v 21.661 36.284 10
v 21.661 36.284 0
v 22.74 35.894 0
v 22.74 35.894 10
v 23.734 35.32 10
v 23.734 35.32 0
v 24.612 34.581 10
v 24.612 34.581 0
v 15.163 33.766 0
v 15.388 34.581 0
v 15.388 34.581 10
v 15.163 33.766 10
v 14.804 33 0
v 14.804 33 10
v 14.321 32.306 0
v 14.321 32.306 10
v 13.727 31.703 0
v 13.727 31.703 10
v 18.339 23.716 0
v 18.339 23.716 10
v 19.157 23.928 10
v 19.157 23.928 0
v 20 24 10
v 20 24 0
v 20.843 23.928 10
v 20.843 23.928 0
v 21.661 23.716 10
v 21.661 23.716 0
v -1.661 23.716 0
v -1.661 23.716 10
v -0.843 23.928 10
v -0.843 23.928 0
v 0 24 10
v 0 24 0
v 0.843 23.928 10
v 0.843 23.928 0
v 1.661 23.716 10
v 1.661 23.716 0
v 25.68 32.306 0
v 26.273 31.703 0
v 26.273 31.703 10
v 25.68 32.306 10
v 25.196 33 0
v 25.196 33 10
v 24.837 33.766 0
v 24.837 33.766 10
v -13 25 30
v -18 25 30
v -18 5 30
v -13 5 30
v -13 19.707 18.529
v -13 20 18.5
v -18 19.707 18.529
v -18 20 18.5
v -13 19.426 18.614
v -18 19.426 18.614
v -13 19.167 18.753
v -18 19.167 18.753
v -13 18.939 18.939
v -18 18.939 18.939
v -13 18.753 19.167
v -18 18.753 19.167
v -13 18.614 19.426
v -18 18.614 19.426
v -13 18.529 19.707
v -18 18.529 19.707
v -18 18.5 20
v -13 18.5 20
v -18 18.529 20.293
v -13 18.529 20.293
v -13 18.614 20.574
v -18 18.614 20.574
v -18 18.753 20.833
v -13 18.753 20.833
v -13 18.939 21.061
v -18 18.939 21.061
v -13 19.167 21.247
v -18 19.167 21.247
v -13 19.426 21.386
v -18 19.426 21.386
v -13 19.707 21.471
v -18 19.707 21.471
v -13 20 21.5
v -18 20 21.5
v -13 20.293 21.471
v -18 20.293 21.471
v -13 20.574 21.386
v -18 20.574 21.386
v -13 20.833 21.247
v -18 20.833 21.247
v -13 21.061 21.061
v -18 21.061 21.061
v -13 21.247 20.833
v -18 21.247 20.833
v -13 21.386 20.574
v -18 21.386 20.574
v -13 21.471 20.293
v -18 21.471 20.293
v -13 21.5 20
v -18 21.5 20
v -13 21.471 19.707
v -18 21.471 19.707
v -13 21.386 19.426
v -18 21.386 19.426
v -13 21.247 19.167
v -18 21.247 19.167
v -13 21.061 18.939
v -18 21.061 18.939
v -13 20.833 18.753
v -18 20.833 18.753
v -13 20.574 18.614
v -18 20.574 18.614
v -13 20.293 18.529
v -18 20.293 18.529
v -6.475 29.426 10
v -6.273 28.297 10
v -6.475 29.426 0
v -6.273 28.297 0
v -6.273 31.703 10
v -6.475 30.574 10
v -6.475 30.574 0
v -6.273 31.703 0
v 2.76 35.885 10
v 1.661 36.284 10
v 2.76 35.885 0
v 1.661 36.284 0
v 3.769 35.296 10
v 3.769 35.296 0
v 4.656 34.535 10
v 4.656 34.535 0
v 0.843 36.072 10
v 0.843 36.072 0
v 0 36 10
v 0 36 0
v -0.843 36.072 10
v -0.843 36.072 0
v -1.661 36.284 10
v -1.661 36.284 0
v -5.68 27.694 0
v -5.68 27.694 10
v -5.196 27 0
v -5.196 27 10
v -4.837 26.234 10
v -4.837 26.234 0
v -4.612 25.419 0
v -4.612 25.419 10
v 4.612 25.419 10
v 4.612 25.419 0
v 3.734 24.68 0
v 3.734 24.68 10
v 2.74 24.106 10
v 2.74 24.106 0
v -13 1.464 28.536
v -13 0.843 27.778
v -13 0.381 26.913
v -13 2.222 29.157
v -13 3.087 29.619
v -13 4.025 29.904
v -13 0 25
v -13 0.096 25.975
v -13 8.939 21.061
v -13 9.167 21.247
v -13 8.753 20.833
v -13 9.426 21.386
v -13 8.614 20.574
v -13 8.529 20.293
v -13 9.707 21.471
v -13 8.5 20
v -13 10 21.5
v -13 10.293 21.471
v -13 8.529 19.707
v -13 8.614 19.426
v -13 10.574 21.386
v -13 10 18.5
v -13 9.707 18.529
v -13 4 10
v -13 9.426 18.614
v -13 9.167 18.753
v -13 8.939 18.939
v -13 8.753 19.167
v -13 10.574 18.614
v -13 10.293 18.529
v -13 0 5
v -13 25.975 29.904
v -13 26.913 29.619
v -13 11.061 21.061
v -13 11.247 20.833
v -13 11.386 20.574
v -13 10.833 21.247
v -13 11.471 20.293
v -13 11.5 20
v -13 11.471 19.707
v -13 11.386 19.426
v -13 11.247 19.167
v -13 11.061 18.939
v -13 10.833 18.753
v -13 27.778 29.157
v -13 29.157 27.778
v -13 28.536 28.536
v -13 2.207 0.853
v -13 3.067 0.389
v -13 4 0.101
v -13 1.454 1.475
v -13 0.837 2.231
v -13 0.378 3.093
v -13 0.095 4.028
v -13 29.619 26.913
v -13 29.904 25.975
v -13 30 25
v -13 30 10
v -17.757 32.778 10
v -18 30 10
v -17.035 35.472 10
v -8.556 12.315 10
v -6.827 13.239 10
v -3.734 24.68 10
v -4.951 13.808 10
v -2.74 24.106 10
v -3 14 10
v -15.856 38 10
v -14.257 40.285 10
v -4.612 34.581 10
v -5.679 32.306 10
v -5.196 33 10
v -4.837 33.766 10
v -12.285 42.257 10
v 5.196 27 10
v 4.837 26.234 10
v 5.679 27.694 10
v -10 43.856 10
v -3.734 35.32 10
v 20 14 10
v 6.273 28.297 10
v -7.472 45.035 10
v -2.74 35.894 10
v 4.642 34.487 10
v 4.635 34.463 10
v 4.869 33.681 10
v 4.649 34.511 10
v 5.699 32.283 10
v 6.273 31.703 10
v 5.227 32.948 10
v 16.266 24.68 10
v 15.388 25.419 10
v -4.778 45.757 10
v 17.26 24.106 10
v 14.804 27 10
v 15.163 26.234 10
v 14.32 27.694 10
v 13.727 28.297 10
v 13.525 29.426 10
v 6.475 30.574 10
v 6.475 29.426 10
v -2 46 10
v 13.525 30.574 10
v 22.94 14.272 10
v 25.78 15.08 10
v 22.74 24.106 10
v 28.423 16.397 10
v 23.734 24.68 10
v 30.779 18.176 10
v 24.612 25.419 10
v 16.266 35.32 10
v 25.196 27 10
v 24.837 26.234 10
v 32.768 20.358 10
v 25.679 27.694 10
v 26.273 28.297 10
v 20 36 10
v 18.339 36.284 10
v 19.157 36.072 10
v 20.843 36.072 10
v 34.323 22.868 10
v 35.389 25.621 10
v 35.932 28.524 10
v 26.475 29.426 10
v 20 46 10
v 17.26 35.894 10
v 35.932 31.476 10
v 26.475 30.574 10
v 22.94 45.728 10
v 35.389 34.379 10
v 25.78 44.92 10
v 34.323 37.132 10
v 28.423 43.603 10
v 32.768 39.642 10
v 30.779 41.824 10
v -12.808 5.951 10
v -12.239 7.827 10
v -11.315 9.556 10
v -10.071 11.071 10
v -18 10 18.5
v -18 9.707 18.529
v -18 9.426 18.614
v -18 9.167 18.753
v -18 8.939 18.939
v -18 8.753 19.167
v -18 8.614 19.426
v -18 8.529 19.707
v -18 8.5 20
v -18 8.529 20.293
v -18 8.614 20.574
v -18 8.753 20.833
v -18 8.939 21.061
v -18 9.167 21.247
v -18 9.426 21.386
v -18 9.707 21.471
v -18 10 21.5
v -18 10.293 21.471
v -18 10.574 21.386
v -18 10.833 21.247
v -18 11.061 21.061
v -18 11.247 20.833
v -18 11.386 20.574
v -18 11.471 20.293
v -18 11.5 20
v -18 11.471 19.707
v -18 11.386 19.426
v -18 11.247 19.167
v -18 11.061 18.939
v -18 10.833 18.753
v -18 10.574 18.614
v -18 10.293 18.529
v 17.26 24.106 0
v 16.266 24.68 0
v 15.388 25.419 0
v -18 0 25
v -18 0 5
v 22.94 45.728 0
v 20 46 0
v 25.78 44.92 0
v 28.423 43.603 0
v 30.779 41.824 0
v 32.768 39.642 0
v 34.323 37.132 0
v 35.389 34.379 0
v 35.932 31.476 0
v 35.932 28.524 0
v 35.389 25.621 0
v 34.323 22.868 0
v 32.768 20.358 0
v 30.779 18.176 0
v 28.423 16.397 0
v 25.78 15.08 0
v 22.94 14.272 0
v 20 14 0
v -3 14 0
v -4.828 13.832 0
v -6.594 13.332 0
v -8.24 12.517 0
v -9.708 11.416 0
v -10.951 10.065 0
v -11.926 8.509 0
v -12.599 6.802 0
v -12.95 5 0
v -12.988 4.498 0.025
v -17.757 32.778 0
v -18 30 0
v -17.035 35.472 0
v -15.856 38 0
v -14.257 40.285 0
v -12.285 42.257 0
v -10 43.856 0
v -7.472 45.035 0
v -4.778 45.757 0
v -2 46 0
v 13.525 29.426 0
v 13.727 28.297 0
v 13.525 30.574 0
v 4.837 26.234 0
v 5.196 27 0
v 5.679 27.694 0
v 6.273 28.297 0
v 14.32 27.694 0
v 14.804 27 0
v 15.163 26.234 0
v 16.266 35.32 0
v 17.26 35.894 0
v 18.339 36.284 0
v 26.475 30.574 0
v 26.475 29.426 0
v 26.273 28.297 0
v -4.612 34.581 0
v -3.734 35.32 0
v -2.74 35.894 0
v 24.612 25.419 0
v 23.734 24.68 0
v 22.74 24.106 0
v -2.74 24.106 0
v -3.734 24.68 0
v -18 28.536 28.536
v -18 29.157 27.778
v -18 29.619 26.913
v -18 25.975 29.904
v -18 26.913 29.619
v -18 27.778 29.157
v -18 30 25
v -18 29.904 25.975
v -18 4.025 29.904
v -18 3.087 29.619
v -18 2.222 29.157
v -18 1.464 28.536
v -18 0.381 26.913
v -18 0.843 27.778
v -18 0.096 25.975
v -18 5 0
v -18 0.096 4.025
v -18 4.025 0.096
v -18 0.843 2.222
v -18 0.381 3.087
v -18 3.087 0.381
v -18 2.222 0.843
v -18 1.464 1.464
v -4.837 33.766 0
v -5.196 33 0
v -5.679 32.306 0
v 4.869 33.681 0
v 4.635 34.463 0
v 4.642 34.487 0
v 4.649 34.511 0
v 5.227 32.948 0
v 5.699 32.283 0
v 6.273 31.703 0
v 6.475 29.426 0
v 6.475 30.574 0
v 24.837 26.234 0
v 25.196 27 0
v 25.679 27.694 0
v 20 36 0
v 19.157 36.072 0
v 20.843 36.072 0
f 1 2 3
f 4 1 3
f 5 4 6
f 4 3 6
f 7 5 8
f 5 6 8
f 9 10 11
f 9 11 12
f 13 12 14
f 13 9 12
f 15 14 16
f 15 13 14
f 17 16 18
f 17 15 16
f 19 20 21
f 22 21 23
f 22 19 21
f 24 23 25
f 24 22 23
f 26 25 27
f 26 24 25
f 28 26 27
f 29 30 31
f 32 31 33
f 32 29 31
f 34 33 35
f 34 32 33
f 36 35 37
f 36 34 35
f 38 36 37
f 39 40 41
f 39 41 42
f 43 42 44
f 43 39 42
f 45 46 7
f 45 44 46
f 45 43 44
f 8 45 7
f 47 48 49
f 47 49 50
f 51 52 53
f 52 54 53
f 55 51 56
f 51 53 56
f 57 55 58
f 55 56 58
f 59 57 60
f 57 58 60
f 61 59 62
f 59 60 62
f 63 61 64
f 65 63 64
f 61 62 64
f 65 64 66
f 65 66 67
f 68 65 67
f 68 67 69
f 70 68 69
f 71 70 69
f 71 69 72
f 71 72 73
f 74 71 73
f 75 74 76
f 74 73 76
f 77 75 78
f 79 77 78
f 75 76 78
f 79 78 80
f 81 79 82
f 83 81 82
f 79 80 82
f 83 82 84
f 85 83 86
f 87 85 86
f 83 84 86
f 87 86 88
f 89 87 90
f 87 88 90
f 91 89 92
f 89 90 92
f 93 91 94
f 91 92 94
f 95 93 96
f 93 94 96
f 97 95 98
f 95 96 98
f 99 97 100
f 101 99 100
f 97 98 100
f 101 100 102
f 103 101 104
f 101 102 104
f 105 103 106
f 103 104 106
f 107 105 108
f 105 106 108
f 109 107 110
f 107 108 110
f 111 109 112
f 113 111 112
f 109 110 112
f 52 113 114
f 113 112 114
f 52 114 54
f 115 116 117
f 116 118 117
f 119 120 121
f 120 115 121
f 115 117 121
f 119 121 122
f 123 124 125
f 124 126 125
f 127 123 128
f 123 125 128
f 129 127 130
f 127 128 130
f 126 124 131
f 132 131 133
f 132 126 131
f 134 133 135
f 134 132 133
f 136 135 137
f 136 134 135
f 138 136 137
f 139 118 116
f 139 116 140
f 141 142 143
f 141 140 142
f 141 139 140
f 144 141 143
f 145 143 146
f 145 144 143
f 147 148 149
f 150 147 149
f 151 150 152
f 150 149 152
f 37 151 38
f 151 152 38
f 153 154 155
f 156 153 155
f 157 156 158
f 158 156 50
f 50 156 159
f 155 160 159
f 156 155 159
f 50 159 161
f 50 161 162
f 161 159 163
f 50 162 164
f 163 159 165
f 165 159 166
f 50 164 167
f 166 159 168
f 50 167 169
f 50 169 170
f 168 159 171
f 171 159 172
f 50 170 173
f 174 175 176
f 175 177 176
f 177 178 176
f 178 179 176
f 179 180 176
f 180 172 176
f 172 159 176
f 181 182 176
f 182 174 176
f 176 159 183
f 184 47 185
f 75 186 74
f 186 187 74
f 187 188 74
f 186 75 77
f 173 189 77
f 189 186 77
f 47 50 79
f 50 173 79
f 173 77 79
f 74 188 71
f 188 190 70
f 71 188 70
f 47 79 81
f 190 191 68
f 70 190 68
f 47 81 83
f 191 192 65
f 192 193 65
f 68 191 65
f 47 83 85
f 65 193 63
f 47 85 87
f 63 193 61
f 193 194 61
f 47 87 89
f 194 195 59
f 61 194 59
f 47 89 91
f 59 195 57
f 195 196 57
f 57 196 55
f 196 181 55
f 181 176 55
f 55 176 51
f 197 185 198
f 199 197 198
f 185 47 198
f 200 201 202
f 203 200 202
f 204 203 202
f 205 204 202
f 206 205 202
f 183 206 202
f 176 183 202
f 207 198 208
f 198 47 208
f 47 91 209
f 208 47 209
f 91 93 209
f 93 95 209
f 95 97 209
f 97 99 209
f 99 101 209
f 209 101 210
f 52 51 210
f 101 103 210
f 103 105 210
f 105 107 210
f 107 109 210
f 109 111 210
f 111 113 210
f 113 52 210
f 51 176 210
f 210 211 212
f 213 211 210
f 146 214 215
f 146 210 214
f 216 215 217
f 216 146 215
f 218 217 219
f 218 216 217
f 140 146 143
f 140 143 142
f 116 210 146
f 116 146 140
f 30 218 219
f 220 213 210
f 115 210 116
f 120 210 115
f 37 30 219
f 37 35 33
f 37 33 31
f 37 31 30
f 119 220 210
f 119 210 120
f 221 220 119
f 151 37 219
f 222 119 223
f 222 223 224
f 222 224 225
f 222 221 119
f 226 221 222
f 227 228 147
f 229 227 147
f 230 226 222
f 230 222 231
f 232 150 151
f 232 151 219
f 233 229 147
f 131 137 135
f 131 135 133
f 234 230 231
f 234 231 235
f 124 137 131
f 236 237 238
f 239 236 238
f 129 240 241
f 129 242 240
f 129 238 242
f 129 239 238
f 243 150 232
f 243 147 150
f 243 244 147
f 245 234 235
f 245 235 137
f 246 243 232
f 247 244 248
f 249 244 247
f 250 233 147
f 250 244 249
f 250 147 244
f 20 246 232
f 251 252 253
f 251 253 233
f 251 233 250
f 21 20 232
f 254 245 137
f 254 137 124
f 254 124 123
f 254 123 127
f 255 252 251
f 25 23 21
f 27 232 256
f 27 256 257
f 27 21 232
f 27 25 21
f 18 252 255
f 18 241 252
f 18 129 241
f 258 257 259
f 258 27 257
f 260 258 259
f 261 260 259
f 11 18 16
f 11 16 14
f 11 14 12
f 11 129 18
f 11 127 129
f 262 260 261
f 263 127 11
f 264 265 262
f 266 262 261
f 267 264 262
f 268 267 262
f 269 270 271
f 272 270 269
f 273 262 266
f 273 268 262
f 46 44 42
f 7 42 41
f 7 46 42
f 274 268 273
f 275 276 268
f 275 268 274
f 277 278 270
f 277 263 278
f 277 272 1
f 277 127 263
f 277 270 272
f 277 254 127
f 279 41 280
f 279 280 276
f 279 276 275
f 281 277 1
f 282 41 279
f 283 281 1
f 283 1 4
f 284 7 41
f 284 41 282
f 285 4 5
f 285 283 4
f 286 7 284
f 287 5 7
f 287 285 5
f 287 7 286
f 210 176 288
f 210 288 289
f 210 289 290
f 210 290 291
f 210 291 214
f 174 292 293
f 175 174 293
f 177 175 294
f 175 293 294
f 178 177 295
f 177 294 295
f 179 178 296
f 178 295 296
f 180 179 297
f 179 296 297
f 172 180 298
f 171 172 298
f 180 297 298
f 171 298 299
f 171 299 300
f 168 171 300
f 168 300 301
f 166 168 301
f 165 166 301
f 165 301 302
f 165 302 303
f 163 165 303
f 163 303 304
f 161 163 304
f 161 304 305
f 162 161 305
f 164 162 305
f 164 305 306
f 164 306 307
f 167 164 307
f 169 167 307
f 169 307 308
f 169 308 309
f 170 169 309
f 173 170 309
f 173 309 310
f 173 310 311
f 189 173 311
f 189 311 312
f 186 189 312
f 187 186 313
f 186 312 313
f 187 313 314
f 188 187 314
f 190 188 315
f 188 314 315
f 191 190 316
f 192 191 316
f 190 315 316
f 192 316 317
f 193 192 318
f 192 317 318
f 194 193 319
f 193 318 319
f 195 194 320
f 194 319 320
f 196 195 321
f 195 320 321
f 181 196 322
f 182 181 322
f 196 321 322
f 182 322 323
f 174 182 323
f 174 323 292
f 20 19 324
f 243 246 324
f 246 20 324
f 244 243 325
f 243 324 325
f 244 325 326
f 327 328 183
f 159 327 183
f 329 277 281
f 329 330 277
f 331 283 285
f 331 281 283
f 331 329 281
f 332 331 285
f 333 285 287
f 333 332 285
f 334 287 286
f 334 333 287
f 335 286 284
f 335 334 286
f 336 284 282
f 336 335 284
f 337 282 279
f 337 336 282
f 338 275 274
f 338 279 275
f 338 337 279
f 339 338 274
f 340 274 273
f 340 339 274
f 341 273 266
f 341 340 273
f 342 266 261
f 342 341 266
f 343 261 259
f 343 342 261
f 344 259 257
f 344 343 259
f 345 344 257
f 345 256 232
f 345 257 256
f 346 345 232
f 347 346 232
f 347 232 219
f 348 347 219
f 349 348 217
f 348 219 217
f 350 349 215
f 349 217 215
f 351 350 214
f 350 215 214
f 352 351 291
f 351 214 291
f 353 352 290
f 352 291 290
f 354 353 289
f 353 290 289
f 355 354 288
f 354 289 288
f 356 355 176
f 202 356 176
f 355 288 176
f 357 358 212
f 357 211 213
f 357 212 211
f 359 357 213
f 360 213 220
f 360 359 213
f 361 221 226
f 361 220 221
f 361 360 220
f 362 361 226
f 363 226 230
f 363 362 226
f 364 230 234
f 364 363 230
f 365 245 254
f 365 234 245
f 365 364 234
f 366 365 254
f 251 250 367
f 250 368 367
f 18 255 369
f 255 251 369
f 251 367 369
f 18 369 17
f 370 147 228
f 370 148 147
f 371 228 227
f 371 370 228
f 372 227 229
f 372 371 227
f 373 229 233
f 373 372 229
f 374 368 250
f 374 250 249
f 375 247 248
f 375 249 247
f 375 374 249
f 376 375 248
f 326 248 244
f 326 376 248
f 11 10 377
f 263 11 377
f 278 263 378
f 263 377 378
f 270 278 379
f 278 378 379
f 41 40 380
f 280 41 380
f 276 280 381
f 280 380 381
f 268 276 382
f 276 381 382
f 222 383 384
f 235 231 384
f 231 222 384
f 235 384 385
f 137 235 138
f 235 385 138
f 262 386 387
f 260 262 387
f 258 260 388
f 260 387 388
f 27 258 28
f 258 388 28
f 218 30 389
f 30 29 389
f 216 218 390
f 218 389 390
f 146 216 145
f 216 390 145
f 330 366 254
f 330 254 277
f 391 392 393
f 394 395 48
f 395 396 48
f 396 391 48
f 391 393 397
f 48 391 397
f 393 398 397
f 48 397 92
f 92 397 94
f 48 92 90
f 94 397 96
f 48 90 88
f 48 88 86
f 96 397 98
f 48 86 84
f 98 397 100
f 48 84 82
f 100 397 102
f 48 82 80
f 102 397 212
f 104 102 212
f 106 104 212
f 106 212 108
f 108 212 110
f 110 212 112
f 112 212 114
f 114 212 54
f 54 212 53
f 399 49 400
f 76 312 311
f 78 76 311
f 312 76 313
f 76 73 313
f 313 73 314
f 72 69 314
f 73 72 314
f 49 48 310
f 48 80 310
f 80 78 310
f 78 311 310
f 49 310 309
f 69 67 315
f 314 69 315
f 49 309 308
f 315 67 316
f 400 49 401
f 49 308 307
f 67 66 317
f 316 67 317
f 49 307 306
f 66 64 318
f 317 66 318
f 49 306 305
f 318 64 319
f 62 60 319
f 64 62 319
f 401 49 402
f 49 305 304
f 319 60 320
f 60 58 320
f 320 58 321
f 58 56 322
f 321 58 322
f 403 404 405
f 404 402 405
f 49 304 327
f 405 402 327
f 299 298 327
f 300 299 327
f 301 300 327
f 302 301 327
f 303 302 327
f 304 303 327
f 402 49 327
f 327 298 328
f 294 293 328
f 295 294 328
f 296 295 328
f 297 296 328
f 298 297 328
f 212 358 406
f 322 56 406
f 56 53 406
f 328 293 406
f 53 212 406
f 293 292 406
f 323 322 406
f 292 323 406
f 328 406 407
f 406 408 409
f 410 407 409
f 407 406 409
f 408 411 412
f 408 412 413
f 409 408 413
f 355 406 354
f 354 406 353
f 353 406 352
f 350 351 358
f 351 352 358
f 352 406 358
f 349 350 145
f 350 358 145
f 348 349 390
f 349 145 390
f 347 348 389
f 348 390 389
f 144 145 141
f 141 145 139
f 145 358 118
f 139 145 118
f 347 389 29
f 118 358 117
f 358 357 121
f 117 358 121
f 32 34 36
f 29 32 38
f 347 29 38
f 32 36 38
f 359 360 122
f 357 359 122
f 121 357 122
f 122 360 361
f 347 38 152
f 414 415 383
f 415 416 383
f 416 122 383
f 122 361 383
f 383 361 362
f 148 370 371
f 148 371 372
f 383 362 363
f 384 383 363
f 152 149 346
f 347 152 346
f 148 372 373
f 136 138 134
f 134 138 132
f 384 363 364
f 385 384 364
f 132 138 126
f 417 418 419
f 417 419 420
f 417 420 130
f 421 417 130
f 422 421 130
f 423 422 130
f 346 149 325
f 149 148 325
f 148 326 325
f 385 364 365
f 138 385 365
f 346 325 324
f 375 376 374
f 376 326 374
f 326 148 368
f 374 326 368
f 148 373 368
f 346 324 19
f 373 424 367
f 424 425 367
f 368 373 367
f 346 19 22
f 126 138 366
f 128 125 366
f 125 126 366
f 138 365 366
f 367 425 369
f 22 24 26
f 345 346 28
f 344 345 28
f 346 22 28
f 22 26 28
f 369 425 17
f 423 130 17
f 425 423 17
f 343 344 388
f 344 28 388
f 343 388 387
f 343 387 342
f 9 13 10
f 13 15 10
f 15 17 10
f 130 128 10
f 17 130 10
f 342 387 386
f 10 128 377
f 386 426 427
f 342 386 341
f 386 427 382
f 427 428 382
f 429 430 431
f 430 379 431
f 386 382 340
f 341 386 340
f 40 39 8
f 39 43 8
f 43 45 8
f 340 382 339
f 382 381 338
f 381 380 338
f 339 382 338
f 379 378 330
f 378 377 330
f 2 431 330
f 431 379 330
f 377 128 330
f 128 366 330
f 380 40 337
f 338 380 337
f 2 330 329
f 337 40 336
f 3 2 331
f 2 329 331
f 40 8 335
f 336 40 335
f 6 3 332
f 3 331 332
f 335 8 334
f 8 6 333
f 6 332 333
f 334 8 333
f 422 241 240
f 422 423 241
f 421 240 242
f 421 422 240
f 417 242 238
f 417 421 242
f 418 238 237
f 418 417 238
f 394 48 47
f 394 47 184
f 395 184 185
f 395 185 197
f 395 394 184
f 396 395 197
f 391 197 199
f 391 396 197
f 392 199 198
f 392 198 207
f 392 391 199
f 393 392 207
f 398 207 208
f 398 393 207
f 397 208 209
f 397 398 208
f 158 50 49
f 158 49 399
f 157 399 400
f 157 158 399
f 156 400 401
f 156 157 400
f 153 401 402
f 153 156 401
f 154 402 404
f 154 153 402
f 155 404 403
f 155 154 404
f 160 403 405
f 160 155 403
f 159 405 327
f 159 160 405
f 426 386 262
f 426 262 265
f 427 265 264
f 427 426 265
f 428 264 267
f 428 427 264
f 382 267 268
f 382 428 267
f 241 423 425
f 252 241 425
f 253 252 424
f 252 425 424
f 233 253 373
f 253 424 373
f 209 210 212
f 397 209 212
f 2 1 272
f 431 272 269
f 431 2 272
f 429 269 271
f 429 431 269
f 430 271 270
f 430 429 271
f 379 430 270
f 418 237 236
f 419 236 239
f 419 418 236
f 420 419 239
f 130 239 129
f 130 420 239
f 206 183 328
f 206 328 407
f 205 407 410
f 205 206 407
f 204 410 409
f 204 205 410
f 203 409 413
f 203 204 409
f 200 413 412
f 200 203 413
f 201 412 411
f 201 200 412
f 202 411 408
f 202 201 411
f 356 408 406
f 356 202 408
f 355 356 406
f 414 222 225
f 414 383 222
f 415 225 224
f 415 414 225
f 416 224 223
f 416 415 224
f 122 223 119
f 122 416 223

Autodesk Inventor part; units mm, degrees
ref_plane "YZ Plane" through (0, 0, 0) normal (1, 0, 0) x (0, 1, 0)
ref_plane "XZ Plane" through (0, 0, 0) normal (0, 1, 0) x (-1, 0, 0)
ref_plane "XY Plane" through (0, 0, 0) normal (0, 0, 1) x (1, 0, 0)
sketch "Sketch1" plane through (0, 0, 0) normal (0, 0, 1) x (1, 0, 0)
  circle A0 centre (0, 0) radius 9.25
  circle A1 centre (0, 30) radius 6
  circle A2 centre (20, 30) radius 6
  circle A3 centre (0, 30) radius 6.5
  circle A4 centre (20, 30) radius 6.5
  arc A5 (-1.6614, 36.2841) -> (1.6614, 36.2841) centre (0, 41) ccw
  arc A6 (-6.2729, 31.7032) -> (-4.6115, 34.5808) centre (-9.5263, 35.5) ccw
  arc A7 (-4.6115, 25.4192) -> (-6.2729, 28.2968) centre (-9.5263, 24.5) ccw
  arc A8 (1.6614, 23.7159) -> (-1.6614, 23.7159) centre (0, 19) ccw
  arc A9 (6.2729, 28.2968) -> (4.6115, 25.4192) centre (9.5263, 24.5) ccw
  arc A10 (4.6115, 34.5808) -> (6.2729, 31.7032) centre (9.5263, 35.5) ccw
  arc A11 (18.3386, 36.2841) -> (21.6614, 36.2841) centre (20, 41) ccw
  arc A12 (13.7271, 31.7032) -> (15.3885, 34.5808) centre (10.4737, 35.5) ccw
  arc A13 (15.3885, 25.4192) -> (13.7271, 28.2968) centre (10.4737, 24.5) ccw
  arc A14 (21.6614, 23.7159) -> (18.3386, 23.7159) centre (20, 19) ccw
  arc A15 (26.2729, 28.2968) -> (24.6115, 25.4192) centre (29.5263, 24.5) ccw
  arc A16 (24.6115, 34.5808) -> (26.2729, 31.7032) centre (29.5263, 35.5) ccw
  arc A17 (4.6562, 34.5353) -> (4.5, 33.9686) centre (20, 30) ccw
  arc A18 (20, 14) -> (20, 46) centre (20, 30) ccw
  line L0 (-18, 30) -> (-18, 0)
  line L1 (-2, 46) -> (20, 46)
  line L2 (-18, 0) -> (-13, 0)
  line L3 (-13, 0) -> (-13, 30)
  line L4 (-13, 30) -> (-18, 30)
  line L5 (-18, 30) -> (-18, 0)
  arc A19 (-2, 46) -> (-18, 30) centre (-2, 30) ccw
  line L6 (20, 14) -> (-13, 14)
  point P0 (15.2791, 25.532)
  point P1 (-18, 30)
  point P2 (-1.6614, 23.7159)
  point P3 (1.6614, 23.7159)
  point P4 (-6.2729, 28.2968)
  point P5 (-4.6115, 25.4192)
  point P6 (-4.6115, 34.5808)
  point P7 (4.635, 34.4629)
  point P8 (6.2729, 31.7032)
  point P9 (18.3386, 23.7159)
  point P10 (21.6614, 23.7159)
  point P11 (13.7271, 31.7032)
  point P12 (26.2729, 31.7032)
  point P13 (15.3885, 25.4192)
  point P14 (15.3885, 34.5808)
  point P15 (4.6115, 25.4192)
  dimension "d1" = 12
  dimension "d0" = 18.5
  dimension "d2" = 30
  dimension "d3" = 12
  dimension "d4" = 20
  dimension "d5" = 13
  dimension "d6" = 13
  dimension "d7" = 5
  dimension "d10" = 360
  dimension "d12" = 5
  dimension "d15" = 360
  dimension "d21" = 16
  dimension "d25" = 5
  dimension "d26" = 30
  dimension "d52" = 18
extrude "Extrusion1" add sketch "Sketch1" along normal blind 10 contours A10 A17 A3 | A9 A3 | A8 A3 | A5 A3 | A7 A3 | A6 A3 | A16 A4 | A15 A4 | A11 A4 | A14 A4 | A12 A4 | A13 A4 | L6 L3 L4 A19 L1 A18 | L3 L2 L0 L4 picked at (5.482, 33.1405)
fillet "Fillet2" radius 10 1 edges at (-13, 14, 5)
extrude "Extrusion3" add sketch "Sketch1" along normal blind 30 contours L3 L2 L0 L4
fillet "Fillet3" radius 5 3 edges at (-15.5, 30, 30) (-15.5, 0, 30) (-15.5, 0, 0)
sketch "Sketch3" plane through (-13, 4, 10) normal (1, 0, 0) x (0, 0, -1)
  line L0 (0, 26) -> (-15, 26) projected
  line L1 (-20, 1) -> (-20, 21) projected
  point P0 (10, -4)
  point P1 (-10, 16)
  dimension "d57" = 10
  dimension "d58" = 10
hole "Hole2" at (-13, 20, 20) direction (-1, 0, 0) diameter 3 end through all
sketch "Sketch4" plane through (-13, 4, 10) normal (1, 0, 0) x (0, 0, -1)
  line L0 (5, -4) -> (-15, -4) projected
  line L1 (-20, 1) -> (-20, 21) projected
  point P0 (10, -4)
  point P1 (-10, 6)
  dimension "d66" = 10
  dimension "d67" = 10
hole "Hole3" at (-13, 10, 20) direction (-1, 0, 0) diameter 3 end through all
properties part number "left_holder"
